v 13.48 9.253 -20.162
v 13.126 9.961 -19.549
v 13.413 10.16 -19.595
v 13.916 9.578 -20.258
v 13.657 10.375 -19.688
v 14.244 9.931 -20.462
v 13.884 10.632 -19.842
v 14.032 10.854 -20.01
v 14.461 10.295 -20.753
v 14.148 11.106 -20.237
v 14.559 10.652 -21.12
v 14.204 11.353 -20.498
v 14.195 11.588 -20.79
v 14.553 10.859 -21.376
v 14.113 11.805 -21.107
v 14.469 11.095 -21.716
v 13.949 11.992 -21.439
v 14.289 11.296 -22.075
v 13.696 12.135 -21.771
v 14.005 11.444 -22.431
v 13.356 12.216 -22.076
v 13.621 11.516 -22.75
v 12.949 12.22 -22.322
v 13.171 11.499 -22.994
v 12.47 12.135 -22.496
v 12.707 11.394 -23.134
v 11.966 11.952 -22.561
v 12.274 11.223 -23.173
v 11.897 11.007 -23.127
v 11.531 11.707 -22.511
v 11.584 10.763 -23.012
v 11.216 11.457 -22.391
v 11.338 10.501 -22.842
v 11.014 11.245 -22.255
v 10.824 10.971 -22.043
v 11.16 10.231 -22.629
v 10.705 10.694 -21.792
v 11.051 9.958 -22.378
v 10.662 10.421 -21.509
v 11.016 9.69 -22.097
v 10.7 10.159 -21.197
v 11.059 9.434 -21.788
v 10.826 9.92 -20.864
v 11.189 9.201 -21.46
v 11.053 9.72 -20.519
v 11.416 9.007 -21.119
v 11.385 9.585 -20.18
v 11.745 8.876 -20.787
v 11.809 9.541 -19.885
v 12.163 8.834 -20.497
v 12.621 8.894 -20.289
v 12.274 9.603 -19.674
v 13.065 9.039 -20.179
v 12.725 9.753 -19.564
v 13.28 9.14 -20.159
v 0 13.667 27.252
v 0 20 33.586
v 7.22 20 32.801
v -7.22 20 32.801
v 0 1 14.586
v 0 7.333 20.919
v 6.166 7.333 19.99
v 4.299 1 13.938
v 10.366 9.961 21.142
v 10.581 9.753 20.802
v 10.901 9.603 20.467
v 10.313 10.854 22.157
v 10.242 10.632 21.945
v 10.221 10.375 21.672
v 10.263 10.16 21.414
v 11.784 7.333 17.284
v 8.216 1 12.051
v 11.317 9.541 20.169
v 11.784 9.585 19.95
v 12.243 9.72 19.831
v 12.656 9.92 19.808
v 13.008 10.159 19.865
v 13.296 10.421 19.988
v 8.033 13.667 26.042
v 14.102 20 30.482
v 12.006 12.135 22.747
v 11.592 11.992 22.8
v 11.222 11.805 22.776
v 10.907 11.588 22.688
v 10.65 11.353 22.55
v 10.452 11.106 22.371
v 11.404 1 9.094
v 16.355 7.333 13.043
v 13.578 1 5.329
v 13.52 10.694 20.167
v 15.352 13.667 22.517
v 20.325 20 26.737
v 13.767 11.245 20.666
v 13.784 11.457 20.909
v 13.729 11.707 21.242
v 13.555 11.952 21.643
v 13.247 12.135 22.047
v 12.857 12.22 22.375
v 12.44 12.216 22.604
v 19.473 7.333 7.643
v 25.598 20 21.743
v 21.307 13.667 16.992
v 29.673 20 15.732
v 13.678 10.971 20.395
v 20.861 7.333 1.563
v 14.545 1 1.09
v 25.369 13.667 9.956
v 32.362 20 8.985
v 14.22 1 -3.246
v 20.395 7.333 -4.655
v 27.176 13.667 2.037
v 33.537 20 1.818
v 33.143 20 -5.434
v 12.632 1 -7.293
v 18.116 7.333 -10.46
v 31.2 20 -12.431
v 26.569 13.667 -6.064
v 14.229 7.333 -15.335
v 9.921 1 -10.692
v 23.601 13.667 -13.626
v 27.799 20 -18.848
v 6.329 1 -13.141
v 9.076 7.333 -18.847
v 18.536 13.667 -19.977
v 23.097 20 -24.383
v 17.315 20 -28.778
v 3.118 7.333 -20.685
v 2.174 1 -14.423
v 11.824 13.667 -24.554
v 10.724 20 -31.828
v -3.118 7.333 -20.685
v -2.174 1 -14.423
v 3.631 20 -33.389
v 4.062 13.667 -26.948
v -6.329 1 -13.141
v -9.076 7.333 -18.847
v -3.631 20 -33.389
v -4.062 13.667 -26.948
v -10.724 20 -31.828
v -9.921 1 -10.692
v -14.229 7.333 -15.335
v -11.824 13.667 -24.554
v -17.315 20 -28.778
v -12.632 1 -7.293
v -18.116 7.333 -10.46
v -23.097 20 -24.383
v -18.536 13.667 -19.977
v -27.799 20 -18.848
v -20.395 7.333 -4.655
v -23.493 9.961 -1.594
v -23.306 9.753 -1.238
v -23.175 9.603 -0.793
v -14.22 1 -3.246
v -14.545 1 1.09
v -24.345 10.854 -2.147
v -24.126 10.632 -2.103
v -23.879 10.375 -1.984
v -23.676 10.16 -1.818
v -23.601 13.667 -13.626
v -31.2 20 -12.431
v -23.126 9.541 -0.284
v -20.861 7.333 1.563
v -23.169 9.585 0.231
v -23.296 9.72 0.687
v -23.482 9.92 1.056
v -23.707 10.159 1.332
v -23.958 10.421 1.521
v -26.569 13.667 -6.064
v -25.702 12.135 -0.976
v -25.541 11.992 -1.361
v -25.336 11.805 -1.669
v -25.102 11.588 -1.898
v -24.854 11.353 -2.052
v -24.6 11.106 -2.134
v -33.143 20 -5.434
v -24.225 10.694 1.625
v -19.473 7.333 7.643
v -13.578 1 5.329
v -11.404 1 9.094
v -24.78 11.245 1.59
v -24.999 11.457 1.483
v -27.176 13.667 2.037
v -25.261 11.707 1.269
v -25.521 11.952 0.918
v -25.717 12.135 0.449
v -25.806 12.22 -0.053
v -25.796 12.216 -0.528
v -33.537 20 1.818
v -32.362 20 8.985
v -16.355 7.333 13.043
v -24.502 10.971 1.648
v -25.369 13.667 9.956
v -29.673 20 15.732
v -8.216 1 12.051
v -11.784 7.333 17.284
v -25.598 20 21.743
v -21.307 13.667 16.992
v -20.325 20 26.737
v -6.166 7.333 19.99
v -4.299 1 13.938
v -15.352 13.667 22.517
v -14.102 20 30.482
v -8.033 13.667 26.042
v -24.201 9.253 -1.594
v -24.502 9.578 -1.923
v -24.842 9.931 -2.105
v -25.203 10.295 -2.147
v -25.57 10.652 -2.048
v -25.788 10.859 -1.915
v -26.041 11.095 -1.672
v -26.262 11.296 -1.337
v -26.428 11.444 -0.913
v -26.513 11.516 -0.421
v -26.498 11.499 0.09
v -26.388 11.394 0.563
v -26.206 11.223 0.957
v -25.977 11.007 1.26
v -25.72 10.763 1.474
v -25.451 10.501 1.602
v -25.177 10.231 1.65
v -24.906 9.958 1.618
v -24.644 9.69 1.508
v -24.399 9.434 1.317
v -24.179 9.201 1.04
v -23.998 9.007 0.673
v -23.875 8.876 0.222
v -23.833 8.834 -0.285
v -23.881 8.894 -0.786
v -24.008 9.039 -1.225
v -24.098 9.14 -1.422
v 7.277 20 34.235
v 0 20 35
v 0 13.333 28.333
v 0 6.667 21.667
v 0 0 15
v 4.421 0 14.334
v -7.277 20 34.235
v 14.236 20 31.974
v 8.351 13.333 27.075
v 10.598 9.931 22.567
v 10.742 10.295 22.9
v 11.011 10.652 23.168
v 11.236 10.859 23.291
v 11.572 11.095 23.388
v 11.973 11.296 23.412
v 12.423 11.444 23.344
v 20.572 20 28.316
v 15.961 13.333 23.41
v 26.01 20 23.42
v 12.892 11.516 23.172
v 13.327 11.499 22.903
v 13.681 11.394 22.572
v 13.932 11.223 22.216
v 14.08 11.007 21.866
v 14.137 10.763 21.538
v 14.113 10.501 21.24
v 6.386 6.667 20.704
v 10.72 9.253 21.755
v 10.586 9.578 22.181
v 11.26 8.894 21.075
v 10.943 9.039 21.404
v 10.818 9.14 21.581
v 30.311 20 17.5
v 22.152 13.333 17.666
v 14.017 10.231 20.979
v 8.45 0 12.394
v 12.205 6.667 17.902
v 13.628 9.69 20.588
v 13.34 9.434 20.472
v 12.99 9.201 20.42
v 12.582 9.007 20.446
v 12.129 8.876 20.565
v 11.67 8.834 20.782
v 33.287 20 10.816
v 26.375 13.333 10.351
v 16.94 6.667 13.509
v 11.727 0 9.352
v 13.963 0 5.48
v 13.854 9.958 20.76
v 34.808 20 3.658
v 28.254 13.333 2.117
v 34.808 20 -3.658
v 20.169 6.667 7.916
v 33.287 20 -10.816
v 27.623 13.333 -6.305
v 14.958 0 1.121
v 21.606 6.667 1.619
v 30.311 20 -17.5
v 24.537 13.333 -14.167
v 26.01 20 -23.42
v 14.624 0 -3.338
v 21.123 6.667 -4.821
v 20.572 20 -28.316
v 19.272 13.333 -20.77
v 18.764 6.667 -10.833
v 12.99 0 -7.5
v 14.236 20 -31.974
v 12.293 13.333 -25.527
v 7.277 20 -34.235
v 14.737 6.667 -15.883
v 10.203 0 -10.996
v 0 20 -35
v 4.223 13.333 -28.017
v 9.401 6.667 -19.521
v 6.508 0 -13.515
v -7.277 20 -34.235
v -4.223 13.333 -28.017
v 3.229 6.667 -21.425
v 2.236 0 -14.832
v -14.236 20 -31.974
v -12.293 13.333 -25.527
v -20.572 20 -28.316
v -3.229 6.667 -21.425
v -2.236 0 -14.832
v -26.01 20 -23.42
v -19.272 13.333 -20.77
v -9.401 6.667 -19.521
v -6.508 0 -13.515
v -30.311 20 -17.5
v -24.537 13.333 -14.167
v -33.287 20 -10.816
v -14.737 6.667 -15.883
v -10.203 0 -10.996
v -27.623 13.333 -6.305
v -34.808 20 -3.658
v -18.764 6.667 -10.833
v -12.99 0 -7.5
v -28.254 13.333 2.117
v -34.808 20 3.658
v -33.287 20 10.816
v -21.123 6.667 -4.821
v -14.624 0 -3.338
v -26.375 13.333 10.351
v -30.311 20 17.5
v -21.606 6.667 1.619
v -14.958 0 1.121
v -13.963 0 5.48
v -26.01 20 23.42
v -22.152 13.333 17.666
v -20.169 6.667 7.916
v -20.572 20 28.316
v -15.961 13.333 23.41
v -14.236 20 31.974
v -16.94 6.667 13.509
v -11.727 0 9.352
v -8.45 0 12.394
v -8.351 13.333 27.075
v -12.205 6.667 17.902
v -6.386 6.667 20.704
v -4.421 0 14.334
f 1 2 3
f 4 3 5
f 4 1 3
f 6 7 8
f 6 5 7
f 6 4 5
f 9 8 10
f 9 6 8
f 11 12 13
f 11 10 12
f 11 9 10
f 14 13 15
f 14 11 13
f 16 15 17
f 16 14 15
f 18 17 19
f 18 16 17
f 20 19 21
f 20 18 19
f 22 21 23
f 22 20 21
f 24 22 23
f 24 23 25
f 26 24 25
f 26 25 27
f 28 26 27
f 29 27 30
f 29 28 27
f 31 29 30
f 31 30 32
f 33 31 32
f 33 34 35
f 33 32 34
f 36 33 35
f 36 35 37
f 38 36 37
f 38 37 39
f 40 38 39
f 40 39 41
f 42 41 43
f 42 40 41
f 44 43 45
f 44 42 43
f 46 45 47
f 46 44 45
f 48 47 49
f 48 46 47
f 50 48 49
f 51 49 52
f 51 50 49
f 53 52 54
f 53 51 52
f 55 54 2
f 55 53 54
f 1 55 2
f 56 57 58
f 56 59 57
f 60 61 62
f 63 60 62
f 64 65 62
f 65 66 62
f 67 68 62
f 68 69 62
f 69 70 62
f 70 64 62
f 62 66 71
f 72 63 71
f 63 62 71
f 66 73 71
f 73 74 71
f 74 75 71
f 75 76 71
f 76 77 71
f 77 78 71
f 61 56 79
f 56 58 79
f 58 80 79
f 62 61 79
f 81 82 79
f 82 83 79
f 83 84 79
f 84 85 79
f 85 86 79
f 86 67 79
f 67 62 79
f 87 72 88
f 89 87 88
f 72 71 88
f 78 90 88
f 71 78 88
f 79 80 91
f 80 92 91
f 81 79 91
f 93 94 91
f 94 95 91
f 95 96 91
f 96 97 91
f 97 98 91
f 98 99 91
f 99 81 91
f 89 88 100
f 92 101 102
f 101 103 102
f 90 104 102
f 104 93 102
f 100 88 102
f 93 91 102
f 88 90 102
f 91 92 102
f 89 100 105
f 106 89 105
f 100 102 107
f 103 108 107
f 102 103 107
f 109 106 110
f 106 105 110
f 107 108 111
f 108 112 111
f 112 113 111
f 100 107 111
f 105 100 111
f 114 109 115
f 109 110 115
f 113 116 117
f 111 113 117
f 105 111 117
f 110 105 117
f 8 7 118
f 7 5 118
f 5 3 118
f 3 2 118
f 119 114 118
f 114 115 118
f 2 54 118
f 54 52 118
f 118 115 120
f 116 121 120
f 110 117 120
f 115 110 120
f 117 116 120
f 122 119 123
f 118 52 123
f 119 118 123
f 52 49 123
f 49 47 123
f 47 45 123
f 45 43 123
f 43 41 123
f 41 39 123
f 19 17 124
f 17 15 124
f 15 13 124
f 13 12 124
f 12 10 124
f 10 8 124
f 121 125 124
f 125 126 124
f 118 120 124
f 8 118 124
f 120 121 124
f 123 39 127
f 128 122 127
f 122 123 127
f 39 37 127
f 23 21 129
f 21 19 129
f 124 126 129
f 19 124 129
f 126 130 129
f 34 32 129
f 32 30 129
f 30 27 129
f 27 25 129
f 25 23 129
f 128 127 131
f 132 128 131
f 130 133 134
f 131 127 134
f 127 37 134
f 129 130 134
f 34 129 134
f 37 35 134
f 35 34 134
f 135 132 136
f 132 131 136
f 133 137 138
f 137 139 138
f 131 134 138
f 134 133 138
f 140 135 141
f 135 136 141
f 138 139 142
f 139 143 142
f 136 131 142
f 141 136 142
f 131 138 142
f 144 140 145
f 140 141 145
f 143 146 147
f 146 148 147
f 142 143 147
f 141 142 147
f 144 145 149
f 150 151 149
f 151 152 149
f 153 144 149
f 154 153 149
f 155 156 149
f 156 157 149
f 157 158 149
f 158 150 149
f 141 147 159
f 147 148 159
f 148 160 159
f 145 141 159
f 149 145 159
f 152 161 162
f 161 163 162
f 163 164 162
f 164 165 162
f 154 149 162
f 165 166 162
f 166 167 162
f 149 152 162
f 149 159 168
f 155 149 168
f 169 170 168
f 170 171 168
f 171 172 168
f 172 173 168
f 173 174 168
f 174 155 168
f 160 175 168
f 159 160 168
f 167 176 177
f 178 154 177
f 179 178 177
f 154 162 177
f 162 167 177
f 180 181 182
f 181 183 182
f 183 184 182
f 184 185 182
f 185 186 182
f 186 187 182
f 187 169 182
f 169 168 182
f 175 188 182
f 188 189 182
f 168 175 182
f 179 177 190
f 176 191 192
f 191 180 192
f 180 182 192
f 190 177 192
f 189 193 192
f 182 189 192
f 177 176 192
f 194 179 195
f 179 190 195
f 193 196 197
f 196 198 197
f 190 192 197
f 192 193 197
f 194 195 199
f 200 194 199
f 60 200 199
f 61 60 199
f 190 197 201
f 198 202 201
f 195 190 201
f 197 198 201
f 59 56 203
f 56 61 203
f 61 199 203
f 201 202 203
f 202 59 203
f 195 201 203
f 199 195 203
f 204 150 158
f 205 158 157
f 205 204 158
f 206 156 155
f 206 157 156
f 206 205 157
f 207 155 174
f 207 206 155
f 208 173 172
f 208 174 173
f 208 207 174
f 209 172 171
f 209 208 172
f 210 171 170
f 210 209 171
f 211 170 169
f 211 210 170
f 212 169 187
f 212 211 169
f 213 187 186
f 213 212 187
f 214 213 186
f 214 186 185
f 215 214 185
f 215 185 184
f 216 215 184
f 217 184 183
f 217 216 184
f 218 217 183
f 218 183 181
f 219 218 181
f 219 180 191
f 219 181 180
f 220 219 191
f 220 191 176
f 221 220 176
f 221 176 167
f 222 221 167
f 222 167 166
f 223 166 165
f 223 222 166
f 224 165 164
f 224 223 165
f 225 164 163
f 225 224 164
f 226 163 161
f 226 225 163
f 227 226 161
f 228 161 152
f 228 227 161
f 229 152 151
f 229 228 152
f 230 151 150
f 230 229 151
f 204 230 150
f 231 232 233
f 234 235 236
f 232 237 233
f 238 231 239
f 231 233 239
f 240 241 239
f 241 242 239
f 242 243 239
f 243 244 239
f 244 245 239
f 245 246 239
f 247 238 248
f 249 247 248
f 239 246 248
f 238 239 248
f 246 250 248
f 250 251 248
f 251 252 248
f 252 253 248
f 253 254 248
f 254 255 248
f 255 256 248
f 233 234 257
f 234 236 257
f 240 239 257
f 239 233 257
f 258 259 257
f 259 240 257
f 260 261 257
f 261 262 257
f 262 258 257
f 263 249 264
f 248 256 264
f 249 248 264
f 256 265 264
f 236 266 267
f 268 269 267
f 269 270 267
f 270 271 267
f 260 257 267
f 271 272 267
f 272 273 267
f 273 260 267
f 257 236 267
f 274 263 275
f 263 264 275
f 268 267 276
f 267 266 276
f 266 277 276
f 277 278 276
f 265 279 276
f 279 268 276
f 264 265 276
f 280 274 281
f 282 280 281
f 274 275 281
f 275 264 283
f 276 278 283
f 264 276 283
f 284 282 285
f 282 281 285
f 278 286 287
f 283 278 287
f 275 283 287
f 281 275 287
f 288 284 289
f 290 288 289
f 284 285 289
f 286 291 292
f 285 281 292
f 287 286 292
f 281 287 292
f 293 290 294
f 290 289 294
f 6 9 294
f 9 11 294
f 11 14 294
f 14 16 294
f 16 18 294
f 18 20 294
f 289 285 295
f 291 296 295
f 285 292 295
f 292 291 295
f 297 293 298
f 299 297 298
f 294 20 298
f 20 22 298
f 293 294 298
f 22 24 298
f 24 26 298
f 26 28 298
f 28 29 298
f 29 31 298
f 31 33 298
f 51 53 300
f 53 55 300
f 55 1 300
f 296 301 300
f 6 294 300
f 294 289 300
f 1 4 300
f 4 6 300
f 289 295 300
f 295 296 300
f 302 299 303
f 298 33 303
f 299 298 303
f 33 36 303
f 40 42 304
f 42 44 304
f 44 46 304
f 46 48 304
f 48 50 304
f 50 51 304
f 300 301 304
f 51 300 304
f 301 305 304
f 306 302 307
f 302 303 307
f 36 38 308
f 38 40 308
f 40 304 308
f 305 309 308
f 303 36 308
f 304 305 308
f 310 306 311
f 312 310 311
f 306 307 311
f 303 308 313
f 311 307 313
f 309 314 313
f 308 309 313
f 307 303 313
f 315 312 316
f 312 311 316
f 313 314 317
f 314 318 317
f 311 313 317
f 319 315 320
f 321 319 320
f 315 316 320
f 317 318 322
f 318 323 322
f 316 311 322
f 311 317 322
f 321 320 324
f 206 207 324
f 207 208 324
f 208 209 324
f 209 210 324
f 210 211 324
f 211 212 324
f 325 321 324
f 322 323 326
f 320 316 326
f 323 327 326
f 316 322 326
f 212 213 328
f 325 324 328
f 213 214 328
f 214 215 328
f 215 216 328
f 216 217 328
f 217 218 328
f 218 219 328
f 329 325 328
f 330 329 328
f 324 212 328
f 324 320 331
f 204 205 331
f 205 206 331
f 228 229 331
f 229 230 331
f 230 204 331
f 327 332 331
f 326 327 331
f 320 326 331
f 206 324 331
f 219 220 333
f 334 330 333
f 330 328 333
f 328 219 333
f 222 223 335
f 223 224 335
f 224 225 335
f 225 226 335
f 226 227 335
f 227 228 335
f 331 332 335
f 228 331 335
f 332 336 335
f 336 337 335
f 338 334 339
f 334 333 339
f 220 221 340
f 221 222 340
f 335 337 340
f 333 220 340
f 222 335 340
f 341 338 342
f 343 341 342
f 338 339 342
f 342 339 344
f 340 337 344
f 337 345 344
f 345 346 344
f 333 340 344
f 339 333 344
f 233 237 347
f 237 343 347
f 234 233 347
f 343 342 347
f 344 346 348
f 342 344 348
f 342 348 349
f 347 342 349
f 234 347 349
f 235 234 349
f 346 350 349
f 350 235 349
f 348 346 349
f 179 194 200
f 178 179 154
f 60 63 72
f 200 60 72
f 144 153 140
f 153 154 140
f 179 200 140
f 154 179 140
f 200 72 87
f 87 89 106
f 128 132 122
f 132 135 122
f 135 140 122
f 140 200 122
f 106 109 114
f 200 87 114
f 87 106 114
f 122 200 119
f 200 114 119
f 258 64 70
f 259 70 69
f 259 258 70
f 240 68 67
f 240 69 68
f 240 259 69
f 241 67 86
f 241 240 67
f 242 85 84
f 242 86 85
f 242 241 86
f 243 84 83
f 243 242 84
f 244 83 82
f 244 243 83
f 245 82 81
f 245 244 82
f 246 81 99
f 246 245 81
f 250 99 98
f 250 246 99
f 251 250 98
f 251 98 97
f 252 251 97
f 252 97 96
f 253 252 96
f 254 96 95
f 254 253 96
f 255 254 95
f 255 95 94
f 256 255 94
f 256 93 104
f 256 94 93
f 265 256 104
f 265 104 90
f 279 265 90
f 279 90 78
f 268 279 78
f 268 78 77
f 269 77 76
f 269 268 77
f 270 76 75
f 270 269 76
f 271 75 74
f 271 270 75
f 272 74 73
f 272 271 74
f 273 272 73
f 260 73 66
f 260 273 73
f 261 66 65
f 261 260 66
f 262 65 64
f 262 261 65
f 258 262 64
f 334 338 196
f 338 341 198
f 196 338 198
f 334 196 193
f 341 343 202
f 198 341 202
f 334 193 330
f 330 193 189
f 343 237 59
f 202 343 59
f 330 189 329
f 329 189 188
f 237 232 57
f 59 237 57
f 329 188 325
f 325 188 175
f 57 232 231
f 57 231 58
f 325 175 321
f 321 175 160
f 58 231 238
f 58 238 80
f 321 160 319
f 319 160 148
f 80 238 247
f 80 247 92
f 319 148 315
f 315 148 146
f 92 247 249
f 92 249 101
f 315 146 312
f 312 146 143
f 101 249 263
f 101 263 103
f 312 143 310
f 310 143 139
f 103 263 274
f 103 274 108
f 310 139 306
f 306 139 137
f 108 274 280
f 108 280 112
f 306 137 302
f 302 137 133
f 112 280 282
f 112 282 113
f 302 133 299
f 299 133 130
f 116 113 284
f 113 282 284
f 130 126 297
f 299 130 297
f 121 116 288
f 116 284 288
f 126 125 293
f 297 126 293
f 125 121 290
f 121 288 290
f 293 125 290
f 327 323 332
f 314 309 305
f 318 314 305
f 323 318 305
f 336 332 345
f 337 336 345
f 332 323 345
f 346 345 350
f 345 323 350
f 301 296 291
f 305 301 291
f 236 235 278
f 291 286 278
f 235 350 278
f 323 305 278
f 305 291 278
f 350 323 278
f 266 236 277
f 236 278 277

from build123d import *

# Parameters (mm, degrees)
CROQUIS5_R            = 1.9
CORTAR_EXTRUIR1_DEPTH = 50.497474683
MATRIZC1_COUNT        = 3


with BuildPart() as part:
    # Croquis4 → Revolución1 (revolve)
    with BuildSketch(Plane(origin=(0, 0, 0), x_dir=(0, 0, -1), z_dir=(1, 0, 0))):
        Polygon((-15, 0), (0, 0), (0, 1), (-14.585786438, 1), (-33.585786438, 20), (-35, 20), align=None)
    revolve(axis=Axis((0, 0, 0), (0, 1, 0)))

    # Croquis5 → Cortar-Extruir1 (cut, through all)
    with BuildSketch(Plane(origin=(-7.5, -7.5, -10.606601718), x_dir=(0.5, -0.5, -0.707106781), z_dir=(0.707106781, 0.707106781, 0))):
        with Locations((-25, 10.353571071)):
            Circle(CROQUIS5_R)
    cortar_extruir1 = extrude(amount=CORTAR_EXTRUIR1_DEPTH, mode=Mode.SUBTRACT)

    # MatrizC1: Cortar-Extruir1 ×3 about axis
    matrizc1_axis = Axis((0, 1, 0), (0, 1, 0))
    for i in range(1, MATRIZC1_COUNT):
        add(cortar_extruir1.rotate(matrizc1_axis, i * 360 / MATRIZC1_COUNT), mode=Mode.SUBTRACT)


solid = part.part
